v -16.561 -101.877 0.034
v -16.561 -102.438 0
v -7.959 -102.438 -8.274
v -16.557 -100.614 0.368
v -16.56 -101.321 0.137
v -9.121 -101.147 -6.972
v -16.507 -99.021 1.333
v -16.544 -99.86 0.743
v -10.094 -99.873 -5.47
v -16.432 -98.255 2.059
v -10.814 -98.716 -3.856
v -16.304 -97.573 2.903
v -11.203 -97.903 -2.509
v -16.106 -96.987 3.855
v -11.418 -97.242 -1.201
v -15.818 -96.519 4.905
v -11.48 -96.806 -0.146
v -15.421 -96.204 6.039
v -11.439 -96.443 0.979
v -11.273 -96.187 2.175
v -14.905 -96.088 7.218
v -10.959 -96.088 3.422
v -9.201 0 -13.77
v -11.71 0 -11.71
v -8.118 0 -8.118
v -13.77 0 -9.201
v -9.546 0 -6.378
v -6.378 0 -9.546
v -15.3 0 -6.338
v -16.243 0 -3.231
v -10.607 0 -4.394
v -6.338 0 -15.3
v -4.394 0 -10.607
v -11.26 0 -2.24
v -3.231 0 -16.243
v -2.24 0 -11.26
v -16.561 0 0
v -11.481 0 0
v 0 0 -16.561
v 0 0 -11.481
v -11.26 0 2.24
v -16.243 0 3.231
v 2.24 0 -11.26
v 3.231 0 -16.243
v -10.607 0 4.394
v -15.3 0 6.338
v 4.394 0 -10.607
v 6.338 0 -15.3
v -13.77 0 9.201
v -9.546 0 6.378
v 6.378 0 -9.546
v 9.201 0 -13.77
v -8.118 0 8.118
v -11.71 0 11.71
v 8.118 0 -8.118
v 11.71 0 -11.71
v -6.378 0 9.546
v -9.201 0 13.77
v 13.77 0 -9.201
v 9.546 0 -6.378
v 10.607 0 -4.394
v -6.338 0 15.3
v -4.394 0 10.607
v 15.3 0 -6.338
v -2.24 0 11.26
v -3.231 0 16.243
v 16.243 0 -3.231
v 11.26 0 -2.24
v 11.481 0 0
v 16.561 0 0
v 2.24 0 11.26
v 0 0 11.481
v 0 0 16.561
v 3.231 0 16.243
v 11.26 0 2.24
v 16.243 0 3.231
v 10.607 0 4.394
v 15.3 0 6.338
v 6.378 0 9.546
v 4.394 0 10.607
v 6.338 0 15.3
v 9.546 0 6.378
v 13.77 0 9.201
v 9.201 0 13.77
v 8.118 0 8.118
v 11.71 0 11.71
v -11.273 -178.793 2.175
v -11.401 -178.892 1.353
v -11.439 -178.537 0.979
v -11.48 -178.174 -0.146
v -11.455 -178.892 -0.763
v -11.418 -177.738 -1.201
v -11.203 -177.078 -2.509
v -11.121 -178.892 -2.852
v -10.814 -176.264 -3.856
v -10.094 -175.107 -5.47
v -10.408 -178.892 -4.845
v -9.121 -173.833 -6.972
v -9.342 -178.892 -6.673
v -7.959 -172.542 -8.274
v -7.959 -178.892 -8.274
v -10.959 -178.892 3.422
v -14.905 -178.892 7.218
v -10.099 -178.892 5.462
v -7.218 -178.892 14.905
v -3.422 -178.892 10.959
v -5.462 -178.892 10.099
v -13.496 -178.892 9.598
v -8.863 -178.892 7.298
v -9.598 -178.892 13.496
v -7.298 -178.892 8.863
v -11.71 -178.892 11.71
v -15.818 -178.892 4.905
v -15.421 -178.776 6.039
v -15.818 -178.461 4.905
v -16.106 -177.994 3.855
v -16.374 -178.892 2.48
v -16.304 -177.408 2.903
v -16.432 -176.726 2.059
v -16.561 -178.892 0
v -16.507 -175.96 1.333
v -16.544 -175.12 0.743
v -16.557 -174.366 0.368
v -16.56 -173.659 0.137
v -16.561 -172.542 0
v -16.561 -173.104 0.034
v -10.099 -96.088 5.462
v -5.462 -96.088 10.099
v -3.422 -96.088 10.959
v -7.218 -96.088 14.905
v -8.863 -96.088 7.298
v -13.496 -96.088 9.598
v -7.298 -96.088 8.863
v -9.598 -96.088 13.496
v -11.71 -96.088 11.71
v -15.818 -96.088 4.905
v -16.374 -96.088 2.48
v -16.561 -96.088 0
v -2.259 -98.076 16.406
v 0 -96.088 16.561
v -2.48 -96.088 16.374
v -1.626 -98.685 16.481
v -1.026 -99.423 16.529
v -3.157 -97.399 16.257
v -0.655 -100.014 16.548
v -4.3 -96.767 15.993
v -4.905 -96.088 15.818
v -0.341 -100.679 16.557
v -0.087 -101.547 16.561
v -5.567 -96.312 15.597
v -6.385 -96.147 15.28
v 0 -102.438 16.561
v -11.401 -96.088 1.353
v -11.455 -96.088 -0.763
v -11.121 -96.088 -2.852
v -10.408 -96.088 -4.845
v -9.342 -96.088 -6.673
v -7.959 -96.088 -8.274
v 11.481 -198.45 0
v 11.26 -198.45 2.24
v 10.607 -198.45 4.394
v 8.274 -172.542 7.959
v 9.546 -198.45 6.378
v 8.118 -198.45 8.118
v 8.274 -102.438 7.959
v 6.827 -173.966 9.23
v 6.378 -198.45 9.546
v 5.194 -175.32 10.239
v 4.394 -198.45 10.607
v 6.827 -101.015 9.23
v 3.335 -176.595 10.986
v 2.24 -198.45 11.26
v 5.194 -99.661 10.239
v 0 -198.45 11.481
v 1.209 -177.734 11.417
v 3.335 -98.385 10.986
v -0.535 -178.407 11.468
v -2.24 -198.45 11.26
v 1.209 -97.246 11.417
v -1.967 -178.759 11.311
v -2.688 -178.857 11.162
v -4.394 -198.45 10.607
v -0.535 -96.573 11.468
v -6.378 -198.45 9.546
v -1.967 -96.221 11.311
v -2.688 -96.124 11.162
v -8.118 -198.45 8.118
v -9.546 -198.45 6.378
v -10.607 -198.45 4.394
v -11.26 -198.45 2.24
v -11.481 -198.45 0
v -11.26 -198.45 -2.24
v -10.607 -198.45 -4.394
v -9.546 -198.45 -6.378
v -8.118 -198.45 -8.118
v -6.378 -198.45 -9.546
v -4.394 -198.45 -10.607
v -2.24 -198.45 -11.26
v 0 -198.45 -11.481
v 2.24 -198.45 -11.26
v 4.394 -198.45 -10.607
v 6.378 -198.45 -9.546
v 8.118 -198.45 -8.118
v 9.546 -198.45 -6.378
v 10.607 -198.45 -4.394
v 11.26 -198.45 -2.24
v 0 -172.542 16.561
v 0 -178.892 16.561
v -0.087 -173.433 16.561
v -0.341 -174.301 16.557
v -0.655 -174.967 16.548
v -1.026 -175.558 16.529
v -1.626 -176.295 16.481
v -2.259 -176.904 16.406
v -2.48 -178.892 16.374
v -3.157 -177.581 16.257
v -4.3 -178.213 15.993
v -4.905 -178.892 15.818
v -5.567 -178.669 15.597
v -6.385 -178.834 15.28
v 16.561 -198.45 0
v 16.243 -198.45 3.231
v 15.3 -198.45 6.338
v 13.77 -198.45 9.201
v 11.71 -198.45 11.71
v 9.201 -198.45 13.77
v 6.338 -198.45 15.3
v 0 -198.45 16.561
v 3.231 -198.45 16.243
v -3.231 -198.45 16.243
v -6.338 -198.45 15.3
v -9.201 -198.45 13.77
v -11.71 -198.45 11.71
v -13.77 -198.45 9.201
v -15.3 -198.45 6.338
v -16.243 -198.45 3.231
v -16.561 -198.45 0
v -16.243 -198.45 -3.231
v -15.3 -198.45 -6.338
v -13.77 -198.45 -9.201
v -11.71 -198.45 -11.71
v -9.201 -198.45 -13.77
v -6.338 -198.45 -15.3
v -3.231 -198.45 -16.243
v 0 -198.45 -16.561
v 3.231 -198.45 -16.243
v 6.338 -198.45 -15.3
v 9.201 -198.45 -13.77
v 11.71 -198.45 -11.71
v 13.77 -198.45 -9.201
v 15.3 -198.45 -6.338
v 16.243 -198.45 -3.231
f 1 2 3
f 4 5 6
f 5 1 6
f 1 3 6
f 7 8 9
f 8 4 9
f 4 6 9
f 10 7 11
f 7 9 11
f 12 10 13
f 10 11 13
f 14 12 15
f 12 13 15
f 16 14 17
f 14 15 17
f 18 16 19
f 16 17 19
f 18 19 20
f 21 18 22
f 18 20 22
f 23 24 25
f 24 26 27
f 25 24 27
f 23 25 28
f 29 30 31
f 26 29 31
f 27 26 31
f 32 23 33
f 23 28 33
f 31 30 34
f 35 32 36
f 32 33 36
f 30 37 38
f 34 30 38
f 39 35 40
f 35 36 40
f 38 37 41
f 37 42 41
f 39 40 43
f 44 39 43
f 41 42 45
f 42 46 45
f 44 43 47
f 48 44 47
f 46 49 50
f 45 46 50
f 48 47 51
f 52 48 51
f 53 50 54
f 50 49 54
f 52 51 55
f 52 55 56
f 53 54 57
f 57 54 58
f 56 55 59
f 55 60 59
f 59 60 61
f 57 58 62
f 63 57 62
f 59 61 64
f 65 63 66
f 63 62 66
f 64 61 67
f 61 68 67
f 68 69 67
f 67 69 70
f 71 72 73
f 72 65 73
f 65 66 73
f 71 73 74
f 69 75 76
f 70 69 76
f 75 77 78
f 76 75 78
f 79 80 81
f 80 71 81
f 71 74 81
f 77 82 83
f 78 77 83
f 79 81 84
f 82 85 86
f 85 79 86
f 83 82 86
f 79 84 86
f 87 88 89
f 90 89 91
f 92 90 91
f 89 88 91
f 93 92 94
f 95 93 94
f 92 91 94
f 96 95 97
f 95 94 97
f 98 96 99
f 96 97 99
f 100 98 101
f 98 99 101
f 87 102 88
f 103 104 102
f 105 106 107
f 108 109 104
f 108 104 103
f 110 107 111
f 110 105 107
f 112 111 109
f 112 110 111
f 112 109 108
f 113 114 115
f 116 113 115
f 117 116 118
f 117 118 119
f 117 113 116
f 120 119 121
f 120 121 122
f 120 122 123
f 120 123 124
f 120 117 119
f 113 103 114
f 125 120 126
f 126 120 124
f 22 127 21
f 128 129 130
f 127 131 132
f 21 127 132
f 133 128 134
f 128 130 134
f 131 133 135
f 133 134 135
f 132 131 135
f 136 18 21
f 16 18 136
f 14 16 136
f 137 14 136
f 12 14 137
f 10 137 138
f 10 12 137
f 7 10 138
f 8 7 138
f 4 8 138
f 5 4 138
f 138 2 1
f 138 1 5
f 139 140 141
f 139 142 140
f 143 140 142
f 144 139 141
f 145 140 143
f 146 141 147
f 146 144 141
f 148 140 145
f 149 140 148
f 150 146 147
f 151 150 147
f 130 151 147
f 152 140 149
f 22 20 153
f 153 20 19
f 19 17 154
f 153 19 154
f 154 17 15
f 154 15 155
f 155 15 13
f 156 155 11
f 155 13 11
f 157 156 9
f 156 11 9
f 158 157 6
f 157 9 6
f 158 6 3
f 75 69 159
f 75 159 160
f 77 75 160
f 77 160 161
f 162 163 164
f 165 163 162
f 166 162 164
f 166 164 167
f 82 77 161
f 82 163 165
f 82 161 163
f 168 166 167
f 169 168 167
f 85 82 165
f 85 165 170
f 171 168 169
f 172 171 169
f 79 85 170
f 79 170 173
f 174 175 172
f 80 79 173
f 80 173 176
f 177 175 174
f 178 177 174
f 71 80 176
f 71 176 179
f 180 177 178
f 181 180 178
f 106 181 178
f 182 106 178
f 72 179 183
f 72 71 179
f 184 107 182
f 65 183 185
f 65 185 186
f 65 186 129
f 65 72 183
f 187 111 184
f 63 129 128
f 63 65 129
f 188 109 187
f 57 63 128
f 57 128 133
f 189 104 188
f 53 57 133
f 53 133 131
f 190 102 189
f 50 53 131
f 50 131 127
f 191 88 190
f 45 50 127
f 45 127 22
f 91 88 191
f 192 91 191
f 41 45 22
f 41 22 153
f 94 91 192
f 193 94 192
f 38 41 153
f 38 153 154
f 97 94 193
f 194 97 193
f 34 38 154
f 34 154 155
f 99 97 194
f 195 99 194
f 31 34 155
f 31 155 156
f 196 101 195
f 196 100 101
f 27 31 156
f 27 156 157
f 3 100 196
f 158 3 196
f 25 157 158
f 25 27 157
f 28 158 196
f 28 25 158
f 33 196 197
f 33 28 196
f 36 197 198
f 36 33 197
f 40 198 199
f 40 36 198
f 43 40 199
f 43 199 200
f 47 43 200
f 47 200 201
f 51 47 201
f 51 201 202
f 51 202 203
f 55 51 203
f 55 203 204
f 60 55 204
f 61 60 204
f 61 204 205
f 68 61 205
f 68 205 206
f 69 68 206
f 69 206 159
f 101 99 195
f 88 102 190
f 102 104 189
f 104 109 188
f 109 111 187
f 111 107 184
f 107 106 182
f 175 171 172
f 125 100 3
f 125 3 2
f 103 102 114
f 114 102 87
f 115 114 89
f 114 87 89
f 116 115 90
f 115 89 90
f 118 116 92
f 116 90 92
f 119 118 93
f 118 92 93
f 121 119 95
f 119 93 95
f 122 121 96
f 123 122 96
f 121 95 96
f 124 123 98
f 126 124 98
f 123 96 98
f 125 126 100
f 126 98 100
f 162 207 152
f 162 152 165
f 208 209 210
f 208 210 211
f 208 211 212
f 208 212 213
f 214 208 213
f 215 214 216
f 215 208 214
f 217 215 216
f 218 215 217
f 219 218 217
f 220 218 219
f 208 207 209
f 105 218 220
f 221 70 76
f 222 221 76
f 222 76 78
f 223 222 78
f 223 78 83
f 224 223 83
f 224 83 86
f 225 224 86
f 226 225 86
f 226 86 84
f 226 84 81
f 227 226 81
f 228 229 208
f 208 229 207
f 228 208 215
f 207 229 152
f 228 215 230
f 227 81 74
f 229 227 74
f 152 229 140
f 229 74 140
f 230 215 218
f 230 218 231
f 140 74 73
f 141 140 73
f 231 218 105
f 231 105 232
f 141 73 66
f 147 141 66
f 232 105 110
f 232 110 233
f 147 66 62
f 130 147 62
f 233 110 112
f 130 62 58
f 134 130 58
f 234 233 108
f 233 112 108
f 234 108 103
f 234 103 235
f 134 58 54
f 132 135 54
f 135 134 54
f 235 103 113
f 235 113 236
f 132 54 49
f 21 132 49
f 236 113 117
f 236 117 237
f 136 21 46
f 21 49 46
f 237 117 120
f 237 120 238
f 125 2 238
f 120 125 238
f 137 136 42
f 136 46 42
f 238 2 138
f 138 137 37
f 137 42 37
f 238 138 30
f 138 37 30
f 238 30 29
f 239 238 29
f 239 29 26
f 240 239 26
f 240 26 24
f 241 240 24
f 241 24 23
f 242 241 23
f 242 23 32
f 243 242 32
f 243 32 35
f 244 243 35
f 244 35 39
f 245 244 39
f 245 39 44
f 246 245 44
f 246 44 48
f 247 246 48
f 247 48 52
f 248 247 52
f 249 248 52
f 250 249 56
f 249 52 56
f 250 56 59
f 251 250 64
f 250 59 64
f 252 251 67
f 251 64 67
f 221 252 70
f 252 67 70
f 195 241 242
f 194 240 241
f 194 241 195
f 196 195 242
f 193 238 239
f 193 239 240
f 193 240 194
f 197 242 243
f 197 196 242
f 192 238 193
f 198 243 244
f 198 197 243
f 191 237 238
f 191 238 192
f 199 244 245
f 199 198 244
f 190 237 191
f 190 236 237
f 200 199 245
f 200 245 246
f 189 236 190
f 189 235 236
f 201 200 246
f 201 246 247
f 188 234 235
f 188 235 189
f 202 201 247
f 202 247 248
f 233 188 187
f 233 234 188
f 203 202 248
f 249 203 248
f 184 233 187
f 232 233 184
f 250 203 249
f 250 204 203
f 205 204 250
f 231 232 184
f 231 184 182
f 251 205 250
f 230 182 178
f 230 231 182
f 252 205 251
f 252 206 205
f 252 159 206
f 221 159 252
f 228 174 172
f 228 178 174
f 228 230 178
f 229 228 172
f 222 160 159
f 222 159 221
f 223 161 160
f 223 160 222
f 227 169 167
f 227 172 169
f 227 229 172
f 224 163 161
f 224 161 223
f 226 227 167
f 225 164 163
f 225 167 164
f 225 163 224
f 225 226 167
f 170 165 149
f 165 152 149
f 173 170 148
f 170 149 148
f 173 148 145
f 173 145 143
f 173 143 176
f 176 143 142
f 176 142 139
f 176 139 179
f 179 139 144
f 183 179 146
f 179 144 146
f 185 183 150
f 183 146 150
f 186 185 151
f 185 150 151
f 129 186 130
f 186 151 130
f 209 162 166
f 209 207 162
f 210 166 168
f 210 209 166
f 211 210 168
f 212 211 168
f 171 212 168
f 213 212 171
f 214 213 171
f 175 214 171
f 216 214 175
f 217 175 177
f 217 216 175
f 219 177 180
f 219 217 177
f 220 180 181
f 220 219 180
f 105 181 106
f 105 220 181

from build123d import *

# Parameters (mm, degrees)
F0_R         = 16.5608
F0_R_2       = 11.4808
F1_DEPTH     = 198.4502
F4_DEPTH     = 82.804
F5_T4_DEPTH  = 43.6852975665
F5_S5_R      = 16.5608
F5_T6_DEPTH  = 27
F5_S7_R      = 11.4808
F5_T8_DEPTH  = 27
F5_T12_DEPTH = 43.6852975665
F5_S13_R     = 16.5608
F5_T14_DEPTH = 27
F5_S15_R     = 11.4808
F5_T16_DEPTH = 27
F5_T20_DEPTH = 43.6852975665
F5_S21_R     = 16.5608
F5_T22_DEPTH = 27
F5_S23_R     = 11.4808
F5_T24_DEPTH = 27
F5_T28_DEPTH = 43.6852975665
F5_S29_R     = 16.5608
F5_T30_DEPTH = 27
F5_S31_R     = 11.4808
F5_T32_DEPTH = 27


# Not quite as in the source:
# - a fillet or chamfer that OpenCascade refuses, or shapes differently, is made with other operations: its cross-section is extruded or revolved along the edge and cut away or added


with BuildPart() as f1:
    # F0 (on Front) → F1 (new body)
    with BuildSketch(Plane.XZ):
        Circle(F0_R)
        Circle(F0_R_2, mode=Mode.SUBTRACT)
    extrude(amount=F1_DEPTH)

    # F3 (on offset) → F4 (cut)
    with BuildSketch(Plane(origin=(0, -96.0882, 0), x_dir=(-1, 0, 0), z_dir=(0, 1, 0))):
        with BuildLine():
            Line((7.9590822086, -8.2741633436), (16.5608, 0))
            ThreePointArc((16.5608, 0), (11.7102539819, 11.7102539819), (0, 16.5608))
            Line((0, 16.5608), (-8.2741633436, 7.9590822086))
            Line((-8.2741633436, 7.9590822086), (7.9590822086, -8.2741633436))
        make_face()
    extrude(amount=-F4_DEPTH, mode=Mode.SUBTRACT)

    # F5: fillet of radius 6.35 on 4 edges, made by hand


with BuildPart() as f5_tool2:
    # F5_s3 → F5_t4 (new body)
    with BuildSketch(Plane(origin=(-19.2795314418, 0, 20.0427622378), x_dir=(0, 1, 0), z_dir=(0.6932515337, 0, -0.7206957132))):
        with BuildLine():
            ThreePointArc((-102.4382, 11.4808), (-97.9480719395, 9.6209280605), (-96.0882, 5.1308))
            Line((-96.0882, 5.1308), (-96.0882, 11.4808))
            Line((-96.0882, 11.4808), (-102.4382, 11.4808))
        make_face()
    extrude(amount=F5_T4_DEPTH)

    # F5_s5 → F5_t6 (intersect, symmetric)
    with BuildSketch(Plane.XZ.offset(99.3)):
        Circle(F5_S5_R)
    extrude(amount=F5_T6_DEPTH, both=True, mode=Mode.INTERSECT)

    # F5_s7 → F5_t8 (cut, symmetric)
    with BuildSketch(Plane.XZ.offset(99.3)):
        Circle(F5_S7_R)
    extrude(amount=F5_T8_DEPTH, both=True, mode=Mode.SUBTRACT)


with BuildPart() as f1_1:
    add(f1.part)

    # F5_t1: union F5_tool2
    add(f5_tool2.part)


with BuildPart() as f5_tool10:
    # F5_s11 → F5_t12 (new body)
    with BuildSketch(Plane(origin=(11.4410444464, 0, -11.0053680982), x_dir=(0, 1, 0), z_dir=(-0.7206957132, 0, 0.6932515337))):
        with BuildLine():
            ThreePointArc((-102.4382, 11.4808), (-97.9480719395, 9.6209280605), (-96.0882, 5.1308))
            Line((-96.0882, 5.1308), (-96.0882, 11.4808))
            Line((-96.0882, 11.4808), (-102.4382, 11.4808))
        make_face()
    extrude(amount=F5_T12_DEPTH)

    # F5_s13 → F5_t14 (intersect, symmetric)
    with BuildSketch(Plane.XZ.offset(99.3)):
        Circle(F5_S13_R)
    extrude(amount=F5_T14_DEPTH, both=True, mode=Mode.INTERSECT)

    # F5_s15 → F5_t16 (cut, symmetric)
    with BuildSketch(Plane.XZ.offset(99.3)):
        Circle(F5_S15_R)
    extrude(amount=F5_T16_DEPTH, both=True, mode=Mode.SUBTRACT)


with BuildPart() as f1_2:
    add(f1_1.part)

    # F5_t9: union F5_tool10
    add(f5_tool10.part)


with BuildPart() as f5_tool18:
    # F5_s19 → F5_t20 (new body)
    with BuildSketch(Plane(origin=(-19.2795314418, 0, 20.0427622378), x_dir=(0, 1, 0), z_dir=(0.6932515337, 0, -0.7206957132))):
        with BuildLine():
            ThreePointArc((-172.5422, 11.4808), (-177.0323280605, 9.6209280605), (-178.8922, 5.1308))
            Line((-178.8922, 5.1308), (-178.8922, 11.4808))
            Line((-178.8922, 11.4808), (-172.5422, 11.4808))
        make_face()
    extrude(amount=F5_T20_DEPTH)

    # F5_s21 → F5_t22 (intersect, symmetric)
    with BuildSketch(Plane.XZ.offset(175.7)):
        Circle(F5_S21_R)
    extrude(amount=F5_T22_DEPTH, both=True, mode=Mode.INTERSECT)

    # F5_s23 → F5_t24 (cut, symmetric)
    with BuildSketch(Plane.XZ.offset(175.7)):
        Circle(F5_S23_R)
    extrude(amount=F5_T24_DEPTH, both=True, mode=Mode.SUBTRACT)


with BuildPart() as f1_3:
    add(f1_2.part)

    # F5_t17: union F5_tool18
    add(f5_tool18.part)


with BuildPart() as f5_tool26:
    # F5_s27 → F5_t28 (new body)
    with BuildSketch(Plane(origin=(11.4410444464, 0, -11.0053680982), x_dir=(0, 1, 0), z_dir=(-0.7206957132, 0, 0.6932515337))):
        with BuildLine():
            ThreePointArc((-178.8922, 5.1308), (-177.0323280605, 9.6209280605), (-172.5422, 11.4808))
            Line((-172.5422, 11.4808), (-178.8922, 11.4808))
            Line((-178.8922, 11.4808), (-178.8922, 5.1308))
        make_face()
    extrude(amount=F5_T28_DEPTH)

    # F5_s29 → F5_t30 (intersect, symmetric)
    with BuildSketch(Plane.XZ.offset(175.7)):
        Circle(F5_S29_R)
    extrude(amount=F5_T30_DEPTH, both=True, mode=Mode.INTERSECT)

    # F5_s31 → F5_t32 (cut, symmetric)
    with BuildSketch(Plane.XZ.offset(175.7)):
        Circle(F5_S31_R)
    extrude(amount=F5_T32_DEPTH, both=True, mode=Mode.SUBTRACT)


with BuildPart() as f1_4:
    add(f1_3.part)

    # F5_t25: union F5_tool26
    add(f5_tool26.part)


solid = f1_4.part
